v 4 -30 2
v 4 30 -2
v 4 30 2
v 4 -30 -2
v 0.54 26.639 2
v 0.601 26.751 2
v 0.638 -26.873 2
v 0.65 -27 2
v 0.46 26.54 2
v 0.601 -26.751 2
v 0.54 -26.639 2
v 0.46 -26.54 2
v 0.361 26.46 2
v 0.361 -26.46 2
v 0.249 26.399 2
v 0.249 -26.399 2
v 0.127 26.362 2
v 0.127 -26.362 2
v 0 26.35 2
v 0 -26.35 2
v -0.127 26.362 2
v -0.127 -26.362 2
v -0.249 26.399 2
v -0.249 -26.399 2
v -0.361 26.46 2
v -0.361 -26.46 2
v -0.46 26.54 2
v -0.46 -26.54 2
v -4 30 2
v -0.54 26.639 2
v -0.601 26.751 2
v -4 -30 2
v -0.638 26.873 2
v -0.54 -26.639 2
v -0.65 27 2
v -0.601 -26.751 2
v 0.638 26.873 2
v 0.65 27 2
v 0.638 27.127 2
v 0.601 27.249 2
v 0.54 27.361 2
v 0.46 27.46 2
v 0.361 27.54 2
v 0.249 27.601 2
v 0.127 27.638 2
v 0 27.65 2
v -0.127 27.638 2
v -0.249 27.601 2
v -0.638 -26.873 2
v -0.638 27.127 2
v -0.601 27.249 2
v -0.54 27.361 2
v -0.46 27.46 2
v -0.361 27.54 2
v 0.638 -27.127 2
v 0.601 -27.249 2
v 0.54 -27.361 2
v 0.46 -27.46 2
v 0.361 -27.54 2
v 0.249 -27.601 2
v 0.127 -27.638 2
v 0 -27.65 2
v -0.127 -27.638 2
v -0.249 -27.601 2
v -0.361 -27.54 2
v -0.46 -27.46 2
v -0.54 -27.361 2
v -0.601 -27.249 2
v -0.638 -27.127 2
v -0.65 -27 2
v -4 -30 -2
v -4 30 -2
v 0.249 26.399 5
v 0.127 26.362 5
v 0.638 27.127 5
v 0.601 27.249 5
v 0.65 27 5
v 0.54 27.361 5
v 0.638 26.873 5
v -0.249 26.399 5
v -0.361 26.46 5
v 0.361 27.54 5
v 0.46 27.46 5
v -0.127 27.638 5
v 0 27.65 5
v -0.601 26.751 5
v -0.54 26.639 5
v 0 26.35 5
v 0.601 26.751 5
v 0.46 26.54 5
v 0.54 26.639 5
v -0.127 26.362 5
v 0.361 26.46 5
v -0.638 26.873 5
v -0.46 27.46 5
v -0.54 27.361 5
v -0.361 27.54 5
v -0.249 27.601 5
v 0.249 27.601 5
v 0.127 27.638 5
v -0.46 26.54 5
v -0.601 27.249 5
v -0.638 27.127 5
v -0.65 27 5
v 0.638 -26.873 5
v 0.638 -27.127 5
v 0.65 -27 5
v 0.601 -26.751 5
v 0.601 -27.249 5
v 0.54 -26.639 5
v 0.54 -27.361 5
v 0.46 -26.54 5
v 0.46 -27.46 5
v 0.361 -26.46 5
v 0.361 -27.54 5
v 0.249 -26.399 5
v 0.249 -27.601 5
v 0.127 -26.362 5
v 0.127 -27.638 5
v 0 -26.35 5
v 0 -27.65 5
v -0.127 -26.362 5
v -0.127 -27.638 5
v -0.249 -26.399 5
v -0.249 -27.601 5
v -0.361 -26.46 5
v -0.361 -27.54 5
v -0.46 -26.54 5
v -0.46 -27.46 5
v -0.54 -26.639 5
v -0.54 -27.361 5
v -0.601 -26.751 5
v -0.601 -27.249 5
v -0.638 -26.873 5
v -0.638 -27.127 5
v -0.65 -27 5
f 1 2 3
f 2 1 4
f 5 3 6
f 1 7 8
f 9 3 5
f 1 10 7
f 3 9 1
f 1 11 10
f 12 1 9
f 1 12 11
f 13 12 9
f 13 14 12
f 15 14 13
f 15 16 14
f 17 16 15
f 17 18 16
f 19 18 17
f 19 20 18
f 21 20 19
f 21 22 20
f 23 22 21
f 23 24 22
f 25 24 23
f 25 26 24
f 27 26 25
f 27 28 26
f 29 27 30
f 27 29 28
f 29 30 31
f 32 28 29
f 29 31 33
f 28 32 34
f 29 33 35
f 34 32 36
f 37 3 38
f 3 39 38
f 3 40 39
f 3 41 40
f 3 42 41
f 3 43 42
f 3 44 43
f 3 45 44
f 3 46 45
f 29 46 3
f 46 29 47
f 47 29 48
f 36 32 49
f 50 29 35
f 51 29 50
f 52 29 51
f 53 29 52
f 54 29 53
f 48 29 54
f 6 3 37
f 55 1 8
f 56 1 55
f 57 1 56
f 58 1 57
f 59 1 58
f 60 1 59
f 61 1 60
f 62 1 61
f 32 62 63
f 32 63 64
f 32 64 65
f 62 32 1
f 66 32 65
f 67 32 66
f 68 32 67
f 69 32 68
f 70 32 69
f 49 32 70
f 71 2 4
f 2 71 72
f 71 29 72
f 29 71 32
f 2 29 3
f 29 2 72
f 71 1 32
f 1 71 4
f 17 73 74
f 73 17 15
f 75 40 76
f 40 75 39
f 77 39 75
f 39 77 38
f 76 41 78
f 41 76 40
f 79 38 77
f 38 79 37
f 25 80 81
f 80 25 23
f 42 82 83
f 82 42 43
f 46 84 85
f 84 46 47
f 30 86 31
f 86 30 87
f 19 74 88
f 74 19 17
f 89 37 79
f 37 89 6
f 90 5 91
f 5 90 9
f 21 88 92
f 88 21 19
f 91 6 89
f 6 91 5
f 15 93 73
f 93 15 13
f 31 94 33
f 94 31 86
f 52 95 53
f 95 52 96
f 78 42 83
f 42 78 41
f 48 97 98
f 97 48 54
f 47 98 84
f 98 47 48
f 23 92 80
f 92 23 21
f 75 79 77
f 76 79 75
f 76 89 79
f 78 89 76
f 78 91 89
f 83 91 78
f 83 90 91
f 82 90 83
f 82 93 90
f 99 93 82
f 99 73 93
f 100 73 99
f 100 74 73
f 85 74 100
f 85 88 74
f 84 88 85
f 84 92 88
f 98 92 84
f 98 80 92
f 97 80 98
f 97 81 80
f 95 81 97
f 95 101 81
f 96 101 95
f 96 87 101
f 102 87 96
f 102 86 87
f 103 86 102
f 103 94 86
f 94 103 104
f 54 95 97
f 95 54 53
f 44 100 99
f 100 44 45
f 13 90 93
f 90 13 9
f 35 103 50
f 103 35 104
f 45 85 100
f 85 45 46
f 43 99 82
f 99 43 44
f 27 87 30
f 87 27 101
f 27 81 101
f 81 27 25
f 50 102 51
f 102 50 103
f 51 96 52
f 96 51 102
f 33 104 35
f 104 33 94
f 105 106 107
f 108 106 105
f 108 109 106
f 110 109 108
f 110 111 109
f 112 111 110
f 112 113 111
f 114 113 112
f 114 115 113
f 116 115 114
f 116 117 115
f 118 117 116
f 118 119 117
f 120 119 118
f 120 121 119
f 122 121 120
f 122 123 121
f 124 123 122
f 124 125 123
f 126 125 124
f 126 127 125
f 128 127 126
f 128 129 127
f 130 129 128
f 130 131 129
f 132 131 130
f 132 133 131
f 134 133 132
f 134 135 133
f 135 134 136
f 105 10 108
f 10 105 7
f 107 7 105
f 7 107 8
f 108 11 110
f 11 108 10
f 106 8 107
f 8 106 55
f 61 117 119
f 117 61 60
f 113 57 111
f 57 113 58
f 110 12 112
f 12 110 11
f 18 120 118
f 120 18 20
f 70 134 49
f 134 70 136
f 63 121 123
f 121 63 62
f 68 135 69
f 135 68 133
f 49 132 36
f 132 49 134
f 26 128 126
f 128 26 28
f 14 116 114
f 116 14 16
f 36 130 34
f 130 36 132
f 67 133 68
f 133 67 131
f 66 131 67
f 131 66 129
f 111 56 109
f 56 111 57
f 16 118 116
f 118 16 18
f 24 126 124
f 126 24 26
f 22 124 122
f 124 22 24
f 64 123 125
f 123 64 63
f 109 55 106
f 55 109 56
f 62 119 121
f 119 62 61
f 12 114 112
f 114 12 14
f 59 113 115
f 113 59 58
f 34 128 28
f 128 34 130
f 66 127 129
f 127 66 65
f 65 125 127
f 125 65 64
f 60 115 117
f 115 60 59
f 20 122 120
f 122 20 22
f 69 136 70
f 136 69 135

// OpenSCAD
module A_Pin(){
  cylinder(r=1.3/2,h=5, $fn=32);
}

module Z_CobLightMount() {
  PLATE=[8,60,4];
  union() {
    
    translate(PLATE*-.5)
      cube(PLATE);
    
    translate([0,27,0])
    A_Pin();
    
    translate([0,-27,0])
    A_Pin();
  }
}

Z_CobLightMount();
